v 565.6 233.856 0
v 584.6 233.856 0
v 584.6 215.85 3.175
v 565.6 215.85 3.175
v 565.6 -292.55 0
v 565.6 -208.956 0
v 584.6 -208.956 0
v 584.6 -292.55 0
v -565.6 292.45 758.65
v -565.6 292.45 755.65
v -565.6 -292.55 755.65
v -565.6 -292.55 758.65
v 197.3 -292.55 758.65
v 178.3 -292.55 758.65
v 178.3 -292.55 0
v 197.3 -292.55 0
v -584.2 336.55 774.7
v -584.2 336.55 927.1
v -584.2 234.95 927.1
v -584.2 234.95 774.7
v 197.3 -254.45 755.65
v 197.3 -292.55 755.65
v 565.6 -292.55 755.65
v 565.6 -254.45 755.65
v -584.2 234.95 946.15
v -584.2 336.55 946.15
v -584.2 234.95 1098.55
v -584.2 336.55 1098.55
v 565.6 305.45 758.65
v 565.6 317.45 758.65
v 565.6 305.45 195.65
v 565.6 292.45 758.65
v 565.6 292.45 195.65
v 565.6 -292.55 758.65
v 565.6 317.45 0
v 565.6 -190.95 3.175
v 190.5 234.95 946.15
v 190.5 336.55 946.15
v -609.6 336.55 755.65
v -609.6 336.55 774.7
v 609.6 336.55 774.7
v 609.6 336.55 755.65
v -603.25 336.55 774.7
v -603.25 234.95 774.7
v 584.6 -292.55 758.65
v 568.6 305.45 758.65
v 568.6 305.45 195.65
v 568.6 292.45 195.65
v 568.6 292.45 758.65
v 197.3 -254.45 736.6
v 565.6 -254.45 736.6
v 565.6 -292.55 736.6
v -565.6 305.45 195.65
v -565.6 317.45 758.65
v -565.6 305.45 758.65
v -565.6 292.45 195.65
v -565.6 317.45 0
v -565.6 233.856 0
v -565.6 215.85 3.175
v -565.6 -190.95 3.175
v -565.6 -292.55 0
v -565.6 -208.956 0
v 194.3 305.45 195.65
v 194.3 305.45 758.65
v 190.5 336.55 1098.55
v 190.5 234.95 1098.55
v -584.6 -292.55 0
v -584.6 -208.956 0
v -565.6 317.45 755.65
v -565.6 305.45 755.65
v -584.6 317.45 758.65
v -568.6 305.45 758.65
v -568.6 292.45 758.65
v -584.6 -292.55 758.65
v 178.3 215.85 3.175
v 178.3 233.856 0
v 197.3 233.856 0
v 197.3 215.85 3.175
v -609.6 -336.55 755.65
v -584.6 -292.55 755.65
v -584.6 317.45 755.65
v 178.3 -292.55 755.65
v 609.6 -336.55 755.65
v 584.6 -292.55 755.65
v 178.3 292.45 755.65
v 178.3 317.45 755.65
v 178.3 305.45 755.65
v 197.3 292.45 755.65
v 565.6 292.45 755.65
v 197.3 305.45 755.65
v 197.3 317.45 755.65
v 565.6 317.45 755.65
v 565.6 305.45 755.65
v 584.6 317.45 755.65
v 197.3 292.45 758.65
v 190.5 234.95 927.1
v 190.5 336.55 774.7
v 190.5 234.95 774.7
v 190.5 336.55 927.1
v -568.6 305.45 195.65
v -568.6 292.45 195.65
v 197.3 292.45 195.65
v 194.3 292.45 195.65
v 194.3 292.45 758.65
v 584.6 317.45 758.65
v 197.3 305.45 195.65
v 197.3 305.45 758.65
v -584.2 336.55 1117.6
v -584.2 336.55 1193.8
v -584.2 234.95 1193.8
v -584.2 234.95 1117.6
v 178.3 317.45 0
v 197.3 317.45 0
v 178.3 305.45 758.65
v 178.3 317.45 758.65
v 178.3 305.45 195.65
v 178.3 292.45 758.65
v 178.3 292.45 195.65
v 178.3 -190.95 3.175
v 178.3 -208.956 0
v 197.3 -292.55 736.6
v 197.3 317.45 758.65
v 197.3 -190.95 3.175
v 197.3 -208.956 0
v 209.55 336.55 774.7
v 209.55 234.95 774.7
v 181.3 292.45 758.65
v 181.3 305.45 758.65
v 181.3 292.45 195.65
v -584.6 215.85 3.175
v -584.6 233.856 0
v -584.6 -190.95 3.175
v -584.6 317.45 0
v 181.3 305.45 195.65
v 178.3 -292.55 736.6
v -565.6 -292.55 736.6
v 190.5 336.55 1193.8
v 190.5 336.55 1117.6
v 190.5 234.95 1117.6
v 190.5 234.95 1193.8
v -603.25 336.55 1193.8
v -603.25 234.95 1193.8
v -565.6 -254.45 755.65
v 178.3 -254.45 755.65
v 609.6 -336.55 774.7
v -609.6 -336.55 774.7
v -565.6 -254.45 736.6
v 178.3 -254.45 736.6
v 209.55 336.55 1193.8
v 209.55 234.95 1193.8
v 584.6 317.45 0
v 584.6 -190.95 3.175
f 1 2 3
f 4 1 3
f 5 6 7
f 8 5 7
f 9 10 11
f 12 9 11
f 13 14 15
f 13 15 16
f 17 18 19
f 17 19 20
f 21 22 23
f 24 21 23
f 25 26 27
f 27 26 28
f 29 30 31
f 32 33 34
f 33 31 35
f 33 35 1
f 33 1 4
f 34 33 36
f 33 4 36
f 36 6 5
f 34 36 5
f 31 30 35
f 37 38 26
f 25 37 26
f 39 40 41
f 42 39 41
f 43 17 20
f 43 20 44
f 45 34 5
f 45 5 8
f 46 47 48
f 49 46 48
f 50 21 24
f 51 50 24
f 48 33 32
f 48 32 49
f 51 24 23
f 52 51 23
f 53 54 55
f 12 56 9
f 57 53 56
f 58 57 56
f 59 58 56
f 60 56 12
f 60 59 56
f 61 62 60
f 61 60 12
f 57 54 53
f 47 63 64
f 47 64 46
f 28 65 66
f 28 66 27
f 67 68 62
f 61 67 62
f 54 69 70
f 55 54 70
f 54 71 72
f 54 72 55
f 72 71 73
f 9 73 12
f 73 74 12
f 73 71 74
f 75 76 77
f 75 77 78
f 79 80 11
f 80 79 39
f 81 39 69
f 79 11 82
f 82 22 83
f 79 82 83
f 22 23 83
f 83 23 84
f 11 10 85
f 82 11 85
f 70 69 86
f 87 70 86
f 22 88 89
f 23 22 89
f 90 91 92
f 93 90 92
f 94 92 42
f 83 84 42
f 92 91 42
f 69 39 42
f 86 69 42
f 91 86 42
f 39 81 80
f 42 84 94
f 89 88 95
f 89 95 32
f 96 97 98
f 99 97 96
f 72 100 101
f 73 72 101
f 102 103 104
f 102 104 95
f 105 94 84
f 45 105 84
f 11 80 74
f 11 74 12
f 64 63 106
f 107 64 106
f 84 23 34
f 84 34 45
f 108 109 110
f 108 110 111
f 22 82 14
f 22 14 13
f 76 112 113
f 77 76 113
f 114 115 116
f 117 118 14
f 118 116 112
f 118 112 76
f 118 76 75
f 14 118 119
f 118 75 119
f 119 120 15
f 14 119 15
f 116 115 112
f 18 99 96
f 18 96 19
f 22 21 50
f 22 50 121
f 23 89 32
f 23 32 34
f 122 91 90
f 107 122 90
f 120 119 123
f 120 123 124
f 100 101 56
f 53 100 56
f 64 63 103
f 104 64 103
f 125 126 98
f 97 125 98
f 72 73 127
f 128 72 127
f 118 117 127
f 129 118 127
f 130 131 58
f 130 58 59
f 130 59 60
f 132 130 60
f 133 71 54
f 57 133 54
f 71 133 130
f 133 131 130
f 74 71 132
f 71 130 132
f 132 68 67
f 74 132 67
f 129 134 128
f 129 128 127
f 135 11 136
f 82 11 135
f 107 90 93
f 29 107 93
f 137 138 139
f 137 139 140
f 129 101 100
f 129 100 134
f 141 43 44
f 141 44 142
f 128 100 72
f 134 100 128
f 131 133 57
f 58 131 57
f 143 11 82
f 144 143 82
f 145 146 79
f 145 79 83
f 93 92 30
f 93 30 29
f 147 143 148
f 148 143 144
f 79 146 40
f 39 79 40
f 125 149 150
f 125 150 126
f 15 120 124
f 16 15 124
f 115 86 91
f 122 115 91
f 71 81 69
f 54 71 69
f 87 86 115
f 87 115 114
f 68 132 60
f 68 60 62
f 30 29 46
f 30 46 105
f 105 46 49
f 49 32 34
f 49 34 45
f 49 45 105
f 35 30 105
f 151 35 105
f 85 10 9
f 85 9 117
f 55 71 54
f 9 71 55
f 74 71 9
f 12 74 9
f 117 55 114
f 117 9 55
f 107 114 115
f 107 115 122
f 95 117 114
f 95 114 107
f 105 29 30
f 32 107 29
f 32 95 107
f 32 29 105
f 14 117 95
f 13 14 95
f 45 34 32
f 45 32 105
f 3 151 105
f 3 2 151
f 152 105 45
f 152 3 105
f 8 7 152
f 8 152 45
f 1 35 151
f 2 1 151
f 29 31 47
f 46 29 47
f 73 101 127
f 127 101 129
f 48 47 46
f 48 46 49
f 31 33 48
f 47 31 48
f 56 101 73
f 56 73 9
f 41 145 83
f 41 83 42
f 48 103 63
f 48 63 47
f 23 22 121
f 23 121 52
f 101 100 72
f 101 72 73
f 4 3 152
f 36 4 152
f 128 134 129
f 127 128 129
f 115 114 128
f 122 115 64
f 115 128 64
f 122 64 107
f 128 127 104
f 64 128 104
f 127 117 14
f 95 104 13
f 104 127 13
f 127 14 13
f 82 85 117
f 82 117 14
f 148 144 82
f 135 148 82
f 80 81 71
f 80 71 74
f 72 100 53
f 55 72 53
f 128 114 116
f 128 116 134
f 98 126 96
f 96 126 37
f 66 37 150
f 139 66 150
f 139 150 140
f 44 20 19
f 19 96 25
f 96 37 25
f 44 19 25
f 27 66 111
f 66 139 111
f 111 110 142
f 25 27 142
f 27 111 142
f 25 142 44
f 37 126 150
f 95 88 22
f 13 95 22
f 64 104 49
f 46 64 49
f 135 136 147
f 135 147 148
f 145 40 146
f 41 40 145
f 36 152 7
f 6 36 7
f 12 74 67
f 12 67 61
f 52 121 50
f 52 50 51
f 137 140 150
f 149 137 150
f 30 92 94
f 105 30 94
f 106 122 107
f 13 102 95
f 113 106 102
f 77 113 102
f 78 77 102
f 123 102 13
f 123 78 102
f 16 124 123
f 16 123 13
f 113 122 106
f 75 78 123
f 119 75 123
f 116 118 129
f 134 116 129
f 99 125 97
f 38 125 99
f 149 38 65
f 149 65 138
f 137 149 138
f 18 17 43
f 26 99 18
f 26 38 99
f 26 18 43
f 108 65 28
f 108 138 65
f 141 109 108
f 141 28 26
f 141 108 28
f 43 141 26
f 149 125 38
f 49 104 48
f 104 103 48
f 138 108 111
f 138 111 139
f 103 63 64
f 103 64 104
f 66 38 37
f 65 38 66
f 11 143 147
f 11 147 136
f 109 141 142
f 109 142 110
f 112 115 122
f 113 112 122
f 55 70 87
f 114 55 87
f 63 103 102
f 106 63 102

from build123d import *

# Parameters (mm, degrees)
F1_W          = 1219.2
F1_H          = 673.1
F2_DEPTH      = 19.05
F3_W          = 19
F3_H          = 610
F4_DEPTH      = 755.65
F4_DEPTH_BACK = 3
F5_W          = 749.9
F5_H          = 13
F5_W_2        = 374.3
F6_DEPTH      = 560
F6_DEPTH_BACK = 3
F9_W          = 743.9
F9_H          = 38.1
F9_W_2        = 368.3
F10_DEPTH     = 19.05
F11_W         = 774.7
F11_H         = 152.4
F12_DEPTH     = 101.6
F14_DEPTH     = 1194.201


with BuildPart() as f2:
    # F1 (on offset) → F2 (new body)
    with BuildSketch(Plane.XY.offset(774.7)):
        Rectangle(F1_W, F1_H)
    extrude(amount=-F2_DEPTH)


with BuildPart() as f4:
    # F3 (on face) → F4 (new body, two sides)
    with BuildSketch(Plane(origin=(0, 0, 755.65), x_dir=(1, 0, 0), z_dir=(0, 0, -1))) as f4_sk:
        with Locations((-575.1, -12.45)):
            Rectangle(F3_W, F3_H)
        with Locations((187.8, -12.45)):
            Rectangle(F3_W, F3_H)
        with Locations((575.1, -12.45)):
            Rectangle(F3_W, F3_H)
    extrude(amount=F4_DEPTH)
    extrude(f4_sk.sketch, amount=-F4_DEPTH_BACK)


with BuildPart() as f6:
    # F5 (on face) → F6 (new body, two sides)
    with BuildSketch(Plane(origin=(0, 0, 755.65), x_dir=(1, 0, 0), z_dir=(0, 0, -1))) as f6_sk:
        with Locations((-193.65, -298.95)):
            Rectangle(F5_W, F5_H)
        with Locations((381.45, -298.95)):
            Rectangle(F5_W_2, F5_H)
    extrude(amount=F6_DEPTH)
    extrude(f6_sk.sketch, amount=-F6_DEPTH_BACK)


with BuildPart() as f2_1:
    add(f2.part)

    # F7: cut F4, F6
    add(f4.part, mode=Mode.SUBTRACT)
    add(f6.part, mode=Mode.SUBTRACT)


with BuildPart() as f4_1:
    add(f4.part)

    # F8: cut F6
    add(f6.part, mode=Mode.SUBTRACT)

    # F13 (on face) → F14 (cut, through all)
    with BuildSketch(Plane.YZ.offset(584.6)):
        Polygon((215.85, 3.175), (-190.95, 3.175), (-208.95632, 0), (233.85632, 0), align=None)
    extrude(amount=-F14_DEPTH, mode=Mode.SUBTRACT)


with BuildPart() as f10:
    # F9 (on face) → F10 (new body)
    with BuildSketch(Plane(origin=(0, 0, 755.65), x_dir=(1, 0, 0), z_dir=(0, 0, -1))):
        with Locations((-193.65, 273.5)):
            Rectangle(F9_W, F9_H)
        with Locations((381.45, 273.5)):
            Rectangle(F9_W_2, F9_H)
    extrude(amount=F10_DEPTH)


with BuildPart() as f12:
    # F11 (on face) → F12 (new body)
    with BuildSketch(Plane(origin=(0, 336.55, 0), x_dir=(-1, 0, 0), z_dir=(0, 1, 0))):
        Polygon((584.2, 774.7), (603.25, 774.7), (603.25, 1117.6), (603.25, 1193.8), (584.2, 1193.8), (584.2, 1117.6), (-190.5, 1117.6), (-190.5, 1193.8), (-209.55, 1193.8), (-209.55, 1117.6), (-209.55, 774.7), (-190.5, 774.7), (-190.5, 927.1), (584.2, 927.1), align=None)
        with Locations((196.85, 1022.35)):
            Rectangle(F11_W, F11_H, mode=Mode.SUBTRACT)
    extrude(amount=-F12_DEPTH)


solid = Compound([f6.part, f2_1.part, f4_1.part, f10.part, f12.part])
